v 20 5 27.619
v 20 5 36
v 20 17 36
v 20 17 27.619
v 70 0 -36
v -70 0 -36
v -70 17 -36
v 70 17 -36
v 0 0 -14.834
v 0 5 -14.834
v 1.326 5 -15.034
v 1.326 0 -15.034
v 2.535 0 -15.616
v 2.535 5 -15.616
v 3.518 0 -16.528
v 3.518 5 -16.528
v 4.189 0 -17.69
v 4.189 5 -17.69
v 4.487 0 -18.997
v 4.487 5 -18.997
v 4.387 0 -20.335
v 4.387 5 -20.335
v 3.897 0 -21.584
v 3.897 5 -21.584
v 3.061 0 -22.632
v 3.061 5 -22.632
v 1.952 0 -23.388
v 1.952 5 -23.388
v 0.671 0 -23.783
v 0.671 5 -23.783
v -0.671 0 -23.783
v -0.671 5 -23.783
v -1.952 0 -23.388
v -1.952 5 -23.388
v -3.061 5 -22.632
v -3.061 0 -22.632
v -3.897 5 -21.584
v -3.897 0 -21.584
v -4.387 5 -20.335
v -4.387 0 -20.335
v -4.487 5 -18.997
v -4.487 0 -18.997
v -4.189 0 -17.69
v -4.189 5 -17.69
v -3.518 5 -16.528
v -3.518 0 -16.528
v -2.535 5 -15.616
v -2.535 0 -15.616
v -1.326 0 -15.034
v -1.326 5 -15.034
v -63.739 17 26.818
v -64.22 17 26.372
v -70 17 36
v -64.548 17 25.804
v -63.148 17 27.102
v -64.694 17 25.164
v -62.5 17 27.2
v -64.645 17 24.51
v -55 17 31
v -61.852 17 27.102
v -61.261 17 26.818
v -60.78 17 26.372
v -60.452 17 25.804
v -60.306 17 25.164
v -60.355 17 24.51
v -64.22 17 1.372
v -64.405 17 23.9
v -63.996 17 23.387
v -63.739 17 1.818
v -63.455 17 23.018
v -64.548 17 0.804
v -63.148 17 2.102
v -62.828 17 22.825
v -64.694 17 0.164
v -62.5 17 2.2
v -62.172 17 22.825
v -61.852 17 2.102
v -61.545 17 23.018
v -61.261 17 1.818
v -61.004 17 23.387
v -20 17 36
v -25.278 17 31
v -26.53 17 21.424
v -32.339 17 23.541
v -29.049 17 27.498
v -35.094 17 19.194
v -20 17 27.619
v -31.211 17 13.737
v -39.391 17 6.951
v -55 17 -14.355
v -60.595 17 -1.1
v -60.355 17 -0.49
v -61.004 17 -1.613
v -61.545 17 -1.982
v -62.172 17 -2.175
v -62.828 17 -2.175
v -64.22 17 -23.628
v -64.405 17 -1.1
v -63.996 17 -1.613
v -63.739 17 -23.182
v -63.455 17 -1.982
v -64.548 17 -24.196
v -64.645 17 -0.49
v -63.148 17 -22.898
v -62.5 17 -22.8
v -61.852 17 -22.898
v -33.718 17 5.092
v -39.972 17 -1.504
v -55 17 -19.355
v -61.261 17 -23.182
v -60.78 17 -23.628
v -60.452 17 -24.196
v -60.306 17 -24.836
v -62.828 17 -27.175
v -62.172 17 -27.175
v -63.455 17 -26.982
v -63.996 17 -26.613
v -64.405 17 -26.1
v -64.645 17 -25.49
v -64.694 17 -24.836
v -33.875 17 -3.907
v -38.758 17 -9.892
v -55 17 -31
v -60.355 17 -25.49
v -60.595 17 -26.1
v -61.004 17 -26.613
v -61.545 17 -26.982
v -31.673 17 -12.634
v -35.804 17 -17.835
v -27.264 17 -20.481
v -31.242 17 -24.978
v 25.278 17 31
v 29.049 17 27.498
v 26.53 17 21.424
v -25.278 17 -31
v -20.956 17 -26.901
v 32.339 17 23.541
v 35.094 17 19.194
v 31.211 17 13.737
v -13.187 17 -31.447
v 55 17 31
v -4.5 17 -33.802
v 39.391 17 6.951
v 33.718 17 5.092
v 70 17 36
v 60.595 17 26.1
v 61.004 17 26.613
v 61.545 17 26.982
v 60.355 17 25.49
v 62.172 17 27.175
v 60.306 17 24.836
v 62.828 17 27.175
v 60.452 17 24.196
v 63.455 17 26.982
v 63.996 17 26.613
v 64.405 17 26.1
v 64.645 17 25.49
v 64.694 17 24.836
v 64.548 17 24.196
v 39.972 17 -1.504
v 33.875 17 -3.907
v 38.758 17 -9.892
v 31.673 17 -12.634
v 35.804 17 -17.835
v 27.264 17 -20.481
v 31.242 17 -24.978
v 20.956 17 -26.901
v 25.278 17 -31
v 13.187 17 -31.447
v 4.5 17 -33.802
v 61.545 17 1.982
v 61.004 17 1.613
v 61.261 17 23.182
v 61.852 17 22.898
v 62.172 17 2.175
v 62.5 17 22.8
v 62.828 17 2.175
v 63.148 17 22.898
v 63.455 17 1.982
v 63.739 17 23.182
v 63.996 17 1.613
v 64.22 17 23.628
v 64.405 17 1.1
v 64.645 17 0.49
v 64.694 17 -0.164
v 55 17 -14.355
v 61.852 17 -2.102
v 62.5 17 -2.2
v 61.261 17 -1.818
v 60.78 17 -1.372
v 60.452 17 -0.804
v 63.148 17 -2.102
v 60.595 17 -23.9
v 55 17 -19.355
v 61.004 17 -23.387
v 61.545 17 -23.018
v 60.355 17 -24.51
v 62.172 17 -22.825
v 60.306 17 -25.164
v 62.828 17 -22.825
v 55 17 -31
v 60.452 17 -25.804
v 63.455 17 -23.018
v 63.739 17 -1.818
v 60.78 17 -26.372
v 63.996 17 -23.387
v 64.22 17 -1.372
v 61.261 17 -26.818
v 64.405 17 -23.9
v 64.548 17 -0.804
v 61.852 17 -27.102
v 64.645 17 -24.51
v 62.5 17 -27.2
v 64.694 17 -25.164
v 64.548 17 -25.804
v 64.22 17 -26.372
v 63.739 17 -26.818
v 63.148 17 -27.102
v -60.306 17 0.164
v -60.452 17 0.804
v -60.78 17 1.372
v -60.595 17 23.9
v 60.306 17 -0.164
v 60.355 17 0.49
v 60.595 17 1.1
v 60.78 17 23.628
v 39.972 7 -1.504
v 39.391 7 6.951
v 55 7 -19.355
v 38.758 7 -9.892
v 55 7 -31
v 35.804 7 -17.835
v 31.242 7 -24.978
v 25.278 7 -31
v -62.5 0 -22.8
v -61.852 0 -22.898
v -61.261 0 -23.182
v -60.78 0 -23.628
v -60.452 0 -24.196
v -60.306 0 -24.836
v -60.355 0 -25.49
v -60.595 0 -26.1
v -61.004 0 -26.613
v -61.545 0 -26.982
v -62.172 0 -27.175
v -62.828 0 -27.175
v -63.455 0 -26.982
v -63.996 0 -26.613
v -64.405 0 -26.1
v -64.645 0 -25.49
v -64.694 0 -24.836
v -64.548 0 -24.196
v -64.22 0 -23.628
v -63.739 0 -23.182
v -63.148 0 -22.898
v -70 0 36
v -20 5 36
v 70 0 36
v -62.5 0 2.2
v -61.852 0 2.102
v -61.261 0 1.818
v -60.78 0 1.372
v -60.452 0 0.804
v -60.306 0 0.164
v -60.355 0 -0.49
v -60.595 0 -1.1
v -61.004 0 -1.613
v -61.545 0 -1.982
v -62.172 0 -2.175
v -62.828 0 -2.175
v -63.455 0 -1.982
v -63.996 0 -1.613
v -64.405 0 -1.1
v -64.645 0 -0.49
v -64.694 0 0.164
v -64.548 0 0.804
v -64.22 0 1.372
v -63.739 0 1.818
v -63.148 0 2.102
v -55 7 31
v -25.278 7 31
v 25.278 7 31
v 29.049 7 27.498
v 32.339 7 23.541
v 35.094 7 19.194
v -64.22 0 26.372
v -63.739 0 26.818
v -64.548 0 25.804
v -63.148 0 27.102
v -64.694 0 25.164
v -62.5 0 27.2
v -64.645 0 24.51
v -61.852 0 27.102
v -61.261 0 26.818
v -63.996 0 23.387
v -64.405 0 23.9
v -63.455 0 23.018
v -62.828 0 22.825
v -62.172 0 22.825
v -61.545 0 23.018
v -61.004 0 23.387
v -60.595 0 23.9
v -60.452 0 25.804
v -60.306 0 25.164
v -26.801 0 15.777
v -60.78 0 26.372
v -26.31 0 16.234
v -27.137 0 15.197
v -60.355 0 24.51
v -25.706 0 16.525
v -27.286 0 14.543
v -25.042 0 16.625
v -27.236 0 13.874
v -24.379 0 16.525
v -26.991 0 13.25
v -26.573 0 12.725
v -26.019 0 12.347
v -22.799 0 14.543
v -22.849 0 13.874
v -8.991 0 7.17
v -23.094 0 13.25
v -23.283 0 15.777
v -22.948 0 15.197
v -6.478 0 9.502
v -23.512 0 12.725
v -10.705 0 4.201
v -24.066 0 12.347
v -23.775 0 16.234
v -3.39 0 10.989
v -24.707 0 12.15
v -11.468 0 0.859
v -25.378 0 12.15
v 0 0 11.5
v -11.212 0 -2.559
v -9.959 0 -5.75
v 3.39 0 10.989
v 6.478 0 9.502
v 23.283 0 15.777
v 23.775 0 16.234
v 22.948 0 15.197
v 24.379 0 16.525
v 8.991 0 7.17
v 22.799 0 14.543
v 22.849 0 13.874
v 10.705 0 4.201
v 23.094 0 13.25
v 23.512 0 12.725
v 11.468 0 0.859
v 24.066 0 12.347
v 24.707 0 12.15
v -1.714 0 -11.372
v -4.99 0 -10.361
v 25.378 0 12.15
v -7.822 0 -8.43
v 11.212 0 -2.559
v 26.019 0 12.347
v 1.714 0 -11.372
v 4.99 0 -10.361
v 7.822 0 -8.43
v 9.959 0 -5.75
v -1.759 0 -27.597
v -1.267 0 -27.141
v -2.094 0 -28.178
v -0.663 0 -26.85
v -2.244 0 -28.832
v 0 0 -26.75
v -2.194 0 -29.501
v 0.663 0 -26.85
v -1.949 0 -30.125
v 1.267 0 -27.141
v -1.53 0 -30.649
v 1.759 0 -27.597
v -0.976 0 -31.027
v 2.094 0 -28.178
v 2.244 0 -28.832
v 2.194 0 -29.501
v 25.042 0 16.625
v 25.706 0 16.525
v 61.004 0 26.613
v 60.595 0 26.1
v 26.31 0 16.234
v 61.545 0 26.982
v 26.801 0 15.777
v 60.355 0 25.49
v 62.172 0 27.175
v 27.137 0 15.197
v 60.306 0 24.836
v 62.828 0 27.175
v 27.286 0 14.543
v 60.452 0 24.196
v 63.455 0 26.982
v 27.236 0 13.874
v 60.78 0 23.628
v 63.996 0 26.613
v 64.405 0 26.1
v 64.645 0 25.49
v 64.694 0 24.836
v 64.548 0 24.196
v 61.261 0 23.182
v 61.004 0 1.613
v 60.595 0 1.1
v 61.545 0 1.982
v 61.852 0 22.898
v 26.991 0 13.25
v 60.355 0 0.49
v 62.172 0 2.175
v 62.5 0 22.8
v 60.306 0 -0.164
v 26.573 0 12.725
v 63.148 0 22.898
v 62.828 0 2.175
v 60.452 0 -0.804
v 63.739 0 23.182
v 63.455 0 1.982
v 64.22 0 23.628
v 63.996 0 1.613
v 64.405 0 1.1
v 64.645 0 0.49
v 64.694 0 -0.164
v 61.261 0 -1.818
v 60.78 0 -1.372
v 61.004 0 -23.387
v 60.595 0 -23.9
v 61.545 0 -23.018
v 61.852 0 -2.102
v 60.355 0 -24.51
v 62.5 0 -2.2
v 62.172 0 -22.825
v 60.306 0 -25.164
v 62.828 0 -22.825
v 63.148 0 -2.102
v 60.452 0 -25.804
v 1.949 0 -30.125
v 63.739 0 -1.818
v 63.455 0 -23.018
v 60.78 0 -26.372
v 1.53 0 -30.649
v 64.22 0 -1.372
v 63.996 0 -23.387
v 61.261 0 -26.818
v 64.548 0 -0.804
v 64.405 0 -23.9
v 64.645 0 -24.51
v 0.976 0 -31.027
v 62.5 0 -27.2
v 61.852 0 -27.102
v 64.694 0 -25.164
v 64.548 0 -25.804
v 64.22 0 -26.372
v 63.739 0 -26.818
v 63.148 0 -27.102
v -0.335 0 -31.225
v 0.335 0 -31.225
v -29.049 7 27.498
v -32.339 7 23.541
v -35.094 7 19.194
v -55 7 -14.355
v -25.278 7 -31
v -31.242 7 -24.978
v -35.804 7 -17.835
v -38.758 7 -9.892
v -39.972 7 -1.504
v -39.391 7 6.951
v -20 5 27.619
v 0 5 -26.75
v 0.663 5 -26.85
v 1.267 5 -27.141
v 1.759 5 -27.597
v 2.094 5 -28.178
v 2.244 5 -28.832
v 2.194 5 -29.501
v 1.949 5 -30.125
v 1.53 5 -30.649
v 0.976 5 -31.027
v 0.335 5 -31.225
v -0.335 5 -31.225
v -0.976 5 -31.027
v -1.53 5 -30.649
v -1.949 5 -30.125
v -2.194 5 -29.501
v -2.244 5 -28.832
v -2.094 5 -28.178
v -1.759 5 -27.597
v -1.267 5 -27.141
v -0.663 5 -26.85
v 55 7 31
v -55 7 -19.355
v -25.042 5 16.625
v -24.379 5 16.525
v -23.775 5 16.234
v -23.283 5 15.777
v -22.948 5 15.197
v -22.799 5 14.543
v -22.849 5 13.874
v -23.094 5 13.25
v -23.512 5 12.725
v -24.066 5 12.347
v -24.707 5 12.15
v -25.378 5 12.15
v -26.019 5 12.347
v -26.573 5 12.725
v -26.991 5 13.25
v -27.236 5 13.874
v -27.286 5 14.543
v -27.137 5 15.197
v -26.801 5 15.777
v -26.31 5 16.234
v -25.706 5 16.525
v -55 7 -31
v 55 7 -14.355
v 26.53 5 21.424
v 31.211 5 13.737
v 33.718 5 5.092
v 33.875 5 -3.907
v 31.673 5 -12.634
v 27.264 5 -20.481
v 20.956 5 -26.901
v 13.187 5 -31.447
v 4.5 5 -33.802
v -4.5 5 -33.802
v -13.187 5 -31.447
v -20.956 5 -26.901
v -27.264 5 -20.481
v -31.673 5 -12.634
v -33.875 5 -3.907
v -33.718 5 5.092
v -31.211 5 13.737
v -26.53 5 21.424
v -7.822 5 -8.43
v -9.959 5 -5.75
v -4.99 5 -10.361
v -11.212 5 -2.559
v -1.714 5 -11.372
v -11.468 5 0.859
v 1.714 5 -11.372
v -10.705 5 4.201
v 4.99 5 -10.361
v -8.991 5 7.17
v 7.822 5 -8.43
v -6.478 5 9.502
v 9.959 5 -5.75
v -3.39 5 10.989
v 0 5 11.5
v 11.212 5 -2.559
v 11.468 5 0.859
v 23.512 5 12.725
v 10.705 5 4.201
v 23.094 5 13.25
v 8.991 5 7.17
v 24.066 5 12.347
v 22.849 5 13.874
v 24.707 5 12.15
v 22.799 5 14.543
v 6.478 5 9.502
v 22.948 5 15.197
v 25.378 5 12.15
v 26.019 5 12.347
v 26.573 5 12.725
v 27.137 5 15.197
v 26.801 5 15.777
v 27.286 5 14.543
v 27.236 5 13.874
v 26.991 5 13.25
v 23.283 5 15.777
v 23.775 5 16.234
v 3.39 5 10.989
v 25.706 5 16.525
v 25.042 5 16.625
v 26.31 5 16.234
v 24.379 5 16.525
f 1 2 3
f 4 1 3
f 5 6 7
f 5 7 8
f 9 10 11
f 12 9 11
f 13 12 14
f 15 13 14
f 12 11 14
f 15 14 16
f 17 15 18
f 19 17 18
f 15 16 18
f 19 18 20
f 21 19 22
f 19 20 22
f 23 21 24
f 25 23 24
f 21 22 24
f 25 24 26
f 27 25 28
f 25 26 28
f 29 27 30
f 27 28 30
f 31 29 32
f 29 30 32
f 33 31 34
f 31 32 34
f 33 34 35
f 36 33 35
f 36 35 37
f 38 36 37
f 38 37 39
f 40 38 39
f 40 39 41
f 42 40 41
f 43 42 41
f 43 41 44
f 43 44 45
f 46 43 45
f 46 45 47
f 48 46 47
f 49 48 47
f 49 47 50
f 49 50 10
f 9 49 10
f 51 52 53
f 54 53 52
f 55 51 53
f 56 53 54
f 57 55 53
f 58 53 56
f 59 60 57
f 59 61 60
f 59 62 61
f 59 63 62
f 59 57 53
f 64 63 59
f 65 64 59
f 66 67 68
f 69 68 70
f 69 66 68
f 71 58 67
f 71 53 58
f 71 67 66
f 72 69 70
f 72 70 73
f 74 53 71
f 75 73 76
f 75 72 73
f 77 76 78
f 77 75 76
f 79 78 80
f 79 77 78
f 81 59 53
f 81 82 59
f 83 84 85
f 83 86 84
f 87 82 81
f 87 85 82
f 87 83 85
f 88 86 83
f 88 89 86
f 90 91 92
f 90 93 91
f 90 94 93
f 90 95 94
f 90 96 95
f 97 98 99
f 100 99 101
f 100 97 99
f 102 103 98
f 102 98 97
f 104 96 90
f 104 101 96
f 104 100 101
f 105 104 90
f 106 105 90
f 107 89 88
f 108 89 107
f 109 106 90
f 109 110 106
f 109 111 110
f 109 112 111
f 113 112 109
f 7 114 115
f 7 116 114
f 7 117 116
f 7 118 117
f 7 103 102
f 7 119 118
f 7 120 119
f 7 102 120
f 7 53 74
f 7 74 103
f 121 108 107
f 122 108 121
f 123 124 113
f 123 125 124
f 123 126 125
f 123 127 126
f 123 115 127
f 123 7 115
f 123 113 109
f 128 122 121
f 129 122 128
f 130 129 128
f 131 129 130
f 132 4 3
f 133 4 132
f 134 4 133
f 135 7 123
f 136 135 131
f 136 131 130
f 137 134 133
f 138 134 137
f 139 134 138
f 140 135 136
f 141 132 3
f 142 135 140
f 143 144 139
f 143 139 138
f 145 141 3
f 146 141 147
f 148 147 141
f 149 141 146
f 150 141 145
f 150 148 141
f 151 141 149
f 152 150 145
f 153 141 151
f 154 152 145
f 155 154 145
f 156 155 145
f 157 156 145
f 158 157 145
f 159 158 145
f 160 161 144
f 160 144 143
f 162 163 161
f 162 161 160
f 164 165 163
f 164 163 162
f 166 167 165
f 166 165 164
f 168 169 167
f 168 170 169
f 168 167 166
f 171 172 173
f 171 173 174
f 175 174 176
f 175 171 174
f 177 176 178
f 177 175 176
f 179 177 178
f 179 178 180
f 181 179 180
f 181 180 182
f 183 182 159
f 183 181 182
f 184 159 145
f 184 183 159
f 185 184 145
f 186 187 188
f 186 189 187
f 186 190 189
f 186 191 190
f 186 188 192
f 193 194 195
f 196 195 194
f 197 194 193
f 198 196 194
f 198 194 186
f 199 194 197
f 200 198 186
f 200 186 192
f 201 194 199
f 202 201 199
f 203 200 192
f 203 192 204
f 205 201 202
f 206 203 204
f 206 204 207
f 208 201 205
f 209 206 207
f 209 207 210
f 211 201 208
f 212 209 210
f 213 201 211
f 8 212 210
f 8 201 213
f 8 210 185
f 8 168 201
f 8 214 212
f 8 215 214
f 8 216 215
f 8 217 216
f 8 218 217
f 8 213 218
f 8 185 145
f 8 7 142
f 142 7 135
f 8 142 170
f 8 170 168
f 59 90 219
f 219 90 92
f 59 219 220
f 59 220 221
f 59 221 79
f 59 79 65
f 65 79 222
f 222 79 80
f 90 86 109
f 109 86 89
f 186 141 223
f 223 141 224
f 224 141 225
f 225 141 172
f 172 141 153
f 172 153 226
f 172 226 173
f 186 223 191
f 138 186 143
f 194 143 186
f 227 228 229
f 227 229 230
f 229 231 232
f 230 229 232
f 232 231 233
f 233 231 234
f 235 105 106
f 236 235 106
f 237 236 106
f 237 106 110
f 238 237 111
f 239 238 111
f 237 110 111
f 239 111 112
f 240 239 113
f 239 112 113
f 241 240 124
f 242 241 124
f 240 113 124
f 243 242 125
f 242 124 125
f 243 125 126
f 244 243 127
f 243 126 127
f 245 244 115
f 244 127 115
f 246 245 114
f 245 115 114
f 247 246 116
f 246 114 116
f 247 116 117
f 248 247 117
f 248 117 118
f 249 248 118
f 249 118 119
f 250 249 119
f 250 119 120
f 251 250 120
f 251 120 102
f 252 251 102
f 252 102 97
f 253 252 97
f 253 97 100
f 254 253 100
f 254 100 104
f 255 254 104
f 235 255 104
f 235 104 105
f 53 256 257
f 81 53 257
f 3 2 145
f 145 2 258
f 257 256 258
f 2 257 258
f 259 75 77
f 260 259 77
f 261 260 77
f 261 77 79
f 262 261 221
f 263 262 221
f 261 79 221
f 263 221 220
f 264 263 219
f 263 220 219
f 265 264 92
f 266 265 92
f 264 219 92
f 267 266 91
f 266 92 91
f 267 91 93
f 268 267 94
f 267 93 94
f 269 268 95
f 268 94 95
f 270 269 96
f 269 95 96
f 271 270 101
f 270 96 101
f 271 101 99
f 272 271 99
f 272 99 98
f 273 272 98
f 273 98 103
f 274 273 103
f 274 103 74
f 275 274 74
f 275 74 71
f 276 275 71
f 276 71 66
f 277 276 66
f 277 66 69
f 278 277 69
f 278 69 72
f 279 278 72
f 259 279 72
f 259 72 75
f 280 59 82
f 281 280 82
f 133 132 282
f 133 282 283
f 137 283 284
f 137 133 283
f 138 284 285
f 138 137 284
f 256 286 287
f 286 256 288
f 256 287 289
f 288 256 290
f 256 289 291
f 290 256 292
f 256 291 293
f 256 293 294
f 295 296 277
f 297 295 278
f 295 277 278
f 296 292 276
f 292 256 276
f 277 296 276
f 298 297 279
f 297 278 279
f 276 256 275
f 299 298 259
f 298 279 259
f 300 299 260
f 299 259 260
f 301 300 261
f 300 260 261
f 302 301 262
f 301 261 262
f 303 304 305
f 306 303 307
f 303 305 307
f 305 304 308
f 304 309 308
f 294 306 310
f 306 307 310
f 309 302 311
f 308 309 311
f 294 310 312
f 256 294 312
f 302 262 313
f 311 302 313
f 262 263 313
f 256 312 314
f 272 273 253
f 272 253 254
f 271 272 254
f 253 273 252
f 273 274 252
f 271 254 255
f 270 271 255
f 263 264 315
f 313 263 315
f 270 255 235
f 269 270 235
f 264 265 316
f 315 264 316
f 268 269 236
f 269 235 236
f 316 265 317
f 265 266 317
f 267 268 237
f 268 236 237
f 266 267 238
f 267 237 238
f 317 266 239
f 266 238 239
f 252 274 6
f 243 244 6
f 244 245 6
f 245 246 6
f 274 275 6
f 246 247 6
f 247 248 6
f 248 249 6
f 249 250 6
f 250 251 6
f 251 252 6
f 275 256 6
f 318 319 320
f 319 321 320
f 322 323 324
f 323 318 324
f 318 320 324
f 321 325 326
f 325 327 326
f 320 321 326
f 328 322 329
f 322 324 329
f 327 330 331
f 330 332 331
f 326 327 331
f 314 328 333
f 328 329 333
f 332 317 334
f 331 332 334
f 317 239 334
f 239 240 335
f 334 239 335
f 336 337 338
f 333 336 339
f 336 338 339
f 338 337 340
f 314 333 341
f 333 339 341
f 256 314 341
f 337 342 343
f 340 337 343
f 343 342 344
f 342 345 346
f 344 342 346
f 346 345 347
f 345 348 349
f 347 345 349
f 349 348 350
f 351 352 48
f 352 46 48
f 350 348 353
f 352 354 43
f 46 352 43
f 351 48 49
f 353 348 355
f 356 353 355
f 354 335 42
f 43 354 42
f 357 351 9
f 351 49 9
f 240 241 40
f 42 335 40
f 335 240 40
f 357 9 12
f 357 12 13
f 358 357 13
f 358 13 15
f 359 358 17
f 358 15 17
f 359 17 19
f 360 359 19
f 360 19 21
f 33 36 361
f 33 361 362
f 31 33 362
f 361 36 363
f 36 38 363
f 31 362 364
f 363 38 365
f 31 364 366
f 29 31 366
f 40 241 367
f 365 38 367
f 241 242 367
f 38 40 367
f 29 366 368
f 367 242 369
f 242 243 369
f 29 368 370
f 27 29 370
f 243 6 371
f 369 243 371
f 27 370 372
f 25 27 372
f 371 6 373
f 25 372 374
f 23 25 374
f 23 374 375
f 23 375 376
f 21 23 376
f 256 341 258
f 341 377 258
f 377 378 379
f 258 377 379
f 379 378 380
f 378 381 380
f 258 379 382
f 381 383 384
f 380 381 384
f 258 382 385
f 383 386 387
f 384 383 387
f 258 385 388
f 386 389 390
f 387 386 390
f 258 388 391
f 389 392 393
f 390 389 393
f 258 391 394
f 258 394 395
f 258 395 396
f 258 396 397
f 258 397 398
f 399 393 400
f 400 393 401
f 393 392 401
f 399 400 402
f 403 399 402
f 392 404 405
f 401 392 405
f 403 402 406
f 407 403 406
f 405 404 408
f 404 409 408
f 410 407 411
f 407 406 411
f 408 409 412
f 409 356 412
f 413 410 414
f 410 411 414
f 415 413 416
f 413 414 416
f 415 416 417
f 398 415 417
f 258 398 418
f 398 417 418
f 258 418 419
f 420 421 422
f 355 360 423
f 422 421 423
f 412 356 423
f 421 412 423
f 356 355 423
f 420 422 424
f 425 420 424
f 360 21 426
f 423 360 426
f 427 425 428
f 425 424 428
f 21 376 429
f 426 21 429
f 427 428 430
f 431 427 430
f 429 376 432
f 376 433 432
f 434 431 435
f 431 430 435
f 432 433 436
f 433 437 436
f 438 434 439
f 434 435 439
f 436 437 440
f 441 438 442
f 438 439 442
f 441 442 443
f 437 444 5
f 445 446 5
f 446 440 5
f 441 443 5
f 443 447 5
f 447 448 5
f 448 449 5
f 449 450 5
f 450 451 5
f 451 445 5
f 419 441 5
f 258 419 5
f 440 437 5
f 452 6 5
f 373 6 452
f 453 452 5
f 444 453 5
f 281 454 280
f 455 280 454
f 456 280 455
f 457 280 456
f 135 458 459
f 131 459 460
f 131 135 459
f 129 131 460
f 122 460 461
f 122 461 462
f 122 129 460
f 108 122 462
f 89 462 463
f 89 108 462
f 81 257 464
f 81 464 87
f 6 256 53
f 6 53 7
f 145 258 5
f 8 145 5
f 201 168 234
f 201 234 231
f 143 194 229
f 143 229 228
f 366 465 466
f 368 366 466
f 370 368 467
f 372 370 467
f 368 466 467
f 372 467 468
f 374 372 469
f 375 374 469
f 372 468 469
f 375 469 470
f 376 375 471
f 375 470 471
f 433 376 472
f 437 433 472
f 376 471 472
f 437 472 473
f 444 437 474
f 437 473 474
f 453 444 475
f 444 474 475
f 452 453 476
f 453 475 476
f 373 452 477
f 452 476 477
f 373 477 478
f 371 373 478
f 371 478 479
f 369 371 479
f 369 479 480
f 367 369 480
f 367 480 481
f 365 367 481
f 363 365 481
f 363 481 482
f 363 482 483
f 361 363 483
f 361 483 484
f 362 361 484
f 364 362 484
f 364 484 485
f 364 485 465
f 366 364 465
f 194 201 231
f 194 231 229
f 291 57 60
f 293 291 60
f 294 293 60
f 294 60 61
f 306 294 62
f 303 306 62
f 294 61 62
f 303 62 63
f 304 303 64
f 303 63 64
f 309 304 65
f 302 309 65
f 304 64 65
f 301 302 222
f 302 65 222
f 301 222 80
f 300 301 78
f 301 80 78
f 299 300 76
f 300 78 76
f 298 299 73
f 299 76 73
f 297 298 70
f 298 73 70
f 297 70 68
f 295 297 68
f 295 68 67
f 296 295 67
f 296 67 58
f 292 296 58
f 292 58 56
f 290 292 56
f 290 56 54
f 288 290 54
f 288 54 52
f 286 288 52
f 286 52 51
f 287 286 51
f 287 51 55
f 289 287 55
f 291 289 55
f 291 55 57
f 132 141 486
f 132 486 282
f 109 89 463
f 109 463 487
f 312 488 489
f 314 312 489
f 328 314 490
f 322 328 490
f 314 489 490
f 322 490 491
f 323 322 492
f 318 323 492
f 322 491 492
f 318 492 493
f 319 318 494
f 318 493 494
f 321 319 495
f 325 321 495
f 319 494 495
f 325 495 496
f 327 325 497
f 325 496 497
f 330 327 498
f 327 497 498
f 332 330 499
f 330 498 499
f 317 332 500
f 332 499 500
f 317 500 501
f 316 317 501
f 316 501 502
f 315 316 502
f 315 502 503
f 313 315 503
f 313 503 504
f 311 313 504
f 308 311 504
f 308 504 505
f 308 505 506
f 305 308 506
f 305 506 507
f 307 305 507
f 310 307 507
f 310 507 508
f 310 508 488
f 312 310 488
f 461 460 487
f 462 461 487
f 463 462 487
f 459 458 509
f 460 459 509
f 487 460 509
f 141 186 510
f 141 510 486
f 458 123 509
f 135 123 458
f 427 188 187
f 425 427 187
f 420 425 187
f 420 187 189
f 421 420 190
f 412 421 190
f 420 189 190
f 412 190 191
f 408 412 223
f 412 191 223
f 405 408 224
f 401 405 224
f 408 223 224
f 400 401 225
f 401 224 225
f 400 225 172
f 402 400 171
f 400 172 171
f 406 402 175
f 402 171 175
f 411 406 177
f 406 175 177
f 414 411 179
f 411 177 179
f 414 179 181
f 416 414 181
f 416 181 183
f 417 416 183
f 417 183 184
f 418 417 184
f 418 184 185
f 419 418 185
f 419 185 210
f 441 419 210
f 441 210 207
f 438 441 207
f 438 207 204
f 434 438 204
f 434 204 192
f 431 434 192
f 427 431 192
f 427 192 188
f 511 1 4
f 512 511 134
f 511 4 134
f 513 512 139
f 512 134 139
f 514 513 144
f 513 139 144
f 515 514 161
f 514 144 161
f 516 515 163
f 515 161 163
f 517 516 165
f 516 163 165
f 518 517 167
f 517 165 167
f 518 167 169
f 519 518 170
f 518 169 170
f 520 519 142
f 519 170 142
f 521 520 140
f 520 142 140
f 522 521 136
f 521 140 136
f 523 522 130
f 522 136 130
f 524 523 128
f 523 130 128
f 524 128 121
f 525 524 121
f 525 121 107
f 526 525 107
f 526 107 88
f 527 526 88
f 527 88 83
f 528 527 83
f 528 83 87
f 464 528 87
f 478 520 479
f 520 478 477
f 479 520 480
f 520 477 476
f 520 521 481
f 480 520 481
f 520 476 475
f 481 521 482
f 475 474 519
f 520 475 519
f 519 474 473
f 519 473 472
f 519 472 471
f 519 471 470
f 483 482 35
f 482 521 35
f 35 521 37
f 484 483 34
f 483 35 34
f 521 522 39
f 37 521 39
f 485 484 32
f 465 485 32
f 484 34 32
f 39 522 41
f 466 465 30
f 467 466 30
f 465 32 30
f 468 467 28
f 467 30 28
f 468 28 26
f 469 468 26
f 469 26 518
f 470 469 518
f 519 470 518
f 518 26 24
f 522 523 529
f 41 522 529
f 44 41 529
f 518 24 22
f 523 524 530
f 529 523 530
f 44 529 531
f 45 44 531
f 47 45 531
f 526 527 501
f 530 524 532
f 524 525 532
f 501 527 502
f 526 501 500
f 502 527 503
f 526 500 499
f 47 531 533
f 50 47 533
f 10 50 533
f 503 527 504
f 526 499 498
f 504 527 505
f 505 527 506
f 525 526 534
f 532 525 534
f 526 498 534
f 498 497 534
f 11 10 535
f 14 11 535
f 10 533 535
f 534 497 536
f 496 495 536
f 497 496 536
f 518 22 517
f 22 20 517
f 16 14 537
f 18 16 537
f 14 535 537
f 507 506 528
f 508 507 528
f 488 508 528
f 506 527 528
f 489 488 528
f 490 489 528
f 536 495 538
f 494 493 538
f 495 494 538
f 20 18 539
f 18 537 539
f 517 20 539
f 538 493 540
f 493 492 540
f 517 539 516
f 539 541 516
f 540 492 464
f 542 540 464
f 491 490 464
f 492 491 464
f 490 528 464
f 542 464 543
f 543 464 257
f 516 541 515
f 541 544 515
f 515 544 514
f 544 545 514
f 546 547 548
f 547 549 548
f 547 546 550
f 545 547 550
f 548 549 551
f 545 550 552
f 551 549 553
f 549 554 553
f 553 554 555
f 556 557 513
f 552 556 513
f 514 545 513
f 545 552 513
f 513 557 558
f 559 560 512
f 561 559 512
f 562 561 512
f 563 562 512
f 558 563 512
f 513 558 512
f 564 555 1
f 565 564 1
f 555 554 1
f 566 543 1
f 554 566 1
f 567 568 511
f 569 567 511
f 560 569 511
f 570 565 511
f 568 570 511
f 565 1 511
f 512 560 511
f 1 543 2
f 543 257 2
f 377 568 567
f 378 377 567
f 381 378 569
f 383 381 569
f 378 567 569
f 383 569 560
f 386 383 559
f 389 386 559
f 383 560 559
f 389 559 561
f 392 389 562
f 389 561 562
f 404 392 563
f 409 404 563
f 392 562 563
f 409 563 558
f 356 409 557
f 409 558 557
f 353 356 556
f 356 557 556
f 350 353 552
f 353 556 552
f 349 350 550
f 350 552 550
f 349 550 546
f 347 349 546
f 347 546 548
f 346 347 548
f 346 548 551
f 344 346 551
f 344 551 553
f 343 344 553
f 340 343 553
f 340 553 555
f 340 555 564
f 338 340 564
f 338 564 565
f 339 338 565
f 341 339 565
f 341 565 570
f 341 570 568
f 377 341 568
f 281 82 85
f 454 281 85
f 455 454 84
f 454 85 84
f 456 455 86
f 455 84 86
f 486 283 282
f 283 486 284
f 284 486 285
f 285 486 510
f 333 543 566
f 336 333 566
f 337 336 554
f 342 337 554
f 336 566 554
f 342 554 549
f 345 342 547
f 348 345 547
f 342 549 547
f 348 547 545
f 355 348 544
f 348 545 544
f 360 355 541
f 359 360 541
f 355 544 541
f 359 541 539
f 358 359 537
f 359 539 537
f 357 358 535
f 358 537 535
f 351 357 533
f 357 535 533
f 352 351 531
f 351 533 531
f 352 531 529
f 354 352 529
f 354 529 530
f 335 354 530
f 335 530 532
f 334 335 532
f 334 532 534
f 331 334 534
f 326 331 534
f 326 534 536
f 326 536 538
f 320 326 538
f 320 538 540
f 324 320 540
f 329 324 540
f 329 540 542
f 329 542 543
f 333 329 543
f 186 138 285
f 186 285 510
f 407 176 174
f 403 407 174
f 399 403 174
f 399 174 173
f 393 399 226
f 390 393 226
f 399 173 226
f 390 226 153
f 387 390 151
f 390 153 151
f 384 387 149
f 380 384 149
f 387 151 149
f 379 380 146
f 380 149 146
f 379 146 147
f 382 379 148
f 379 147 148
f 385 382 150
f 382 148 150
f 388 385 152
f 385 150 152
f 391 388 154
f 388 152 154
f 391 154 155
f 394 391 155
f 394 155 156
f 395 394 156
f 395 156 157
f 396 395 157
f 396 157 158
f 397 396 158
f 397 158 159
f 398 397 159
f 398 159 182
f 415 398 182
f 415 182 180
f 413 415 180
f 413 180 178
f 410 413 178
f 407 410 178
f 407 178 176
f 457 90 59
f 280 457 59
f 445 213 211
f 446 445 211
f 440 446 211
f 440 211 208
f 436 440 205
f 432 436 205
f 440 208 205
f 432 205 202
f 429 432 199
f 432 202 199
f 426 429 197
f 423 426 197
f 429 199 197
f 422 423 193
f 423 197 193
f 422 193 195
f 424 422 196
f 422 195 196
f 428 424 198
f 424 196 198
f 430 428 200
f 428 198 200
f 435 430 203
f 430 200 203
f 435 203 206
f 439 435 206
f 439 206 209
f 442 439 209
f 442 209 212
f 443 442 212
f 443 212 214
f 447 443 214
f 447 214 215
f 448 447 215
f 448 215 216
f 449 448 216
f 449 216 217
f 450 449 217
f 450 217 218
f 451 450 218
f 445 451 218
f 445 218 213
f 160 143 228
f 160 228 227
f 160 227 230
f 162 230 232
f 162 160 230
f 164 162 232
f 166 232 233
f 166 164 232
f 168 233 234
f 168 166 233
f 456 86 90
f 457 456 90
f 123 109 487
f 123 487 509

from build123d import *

# Parameters (mm, degrees)
SKETCH1_W           = 140
SKETCH1_H           = 72
BOSS_EXTRUDE1_DEPTH = 17
SKETCH2_R           = 34.1
CUT_EXTRUDE1_DEPTH  = 12
SKETCH3_W           = 40
SKETCH3_H           = 24
CUT_EXTRUDE2_DEPTH  = 10
SKETCH4_R           = 2.2
CUT_EXTRUDE3_DEPTH  = 81.529497701
SKETCH5_R           = 2.25
SKETCH5_R_2         = 4.5
CUT_EXTRUDE4_DEPTH  = 80.62411695
CUT_EXTRUDE5_DEPTH  = 10
SKETCH7_R           = 11.5
CUT_EXTRUDE6_DEPTH  = 10


with BuildPart() as part:
    # Sketch1 → Boss-Extrude1 (new body)
    with BuildSketch(Plane(origin=(0, 0, 0), x_dir=(1, 0, 0), z_dir=(0, 1, 0))):
        Rectangle(SKETCH1_W, SKETCH1_H)
    extrude(amount=BOSS_EXTRUDE1_DEPTH)

    # Sketch2 → Cut-Extrude1 (cut)
    with BuildSketch(Plane(origin=(0, 17, 0), x_dir=(1, 0, 0), z_dir=(0, 1, 0))):
        with Locations(Location((0, 0, 0), (0, 0, 270))):
            Circle(SKETCH2_R)
    extrude(amount=-CUT_EXTRUDE1_DEPTH, mode=Mode.SUBTRACT)

    # Sketch3 → Cut-Extrude2 (cut)
    with BuildSketch(Plane.XY.offset(36)):
        with Locations((0, 17)):
            Rectangle(SKETCH3_W, SKETCH3_H)
    extrude(amount=-CUT_EXTRUDE2_DEPTH, mode=Mode.SUBTRACT)

    # Sketch4 → Cut-Extrude3 (cut, through all)
    with BuildSketch(Plane(origin=(0, 17, 0), x_dir=(1, 0, 0), z_dir=(0, 1, 0))):
        with Locations(Location((-62.5, 25, 0), (0, 0, 270))):
            Circle(SKETCH4_R)
        with Locations(Location((-62.5, 0, 0), (0, 0, 270))):
            Circle(SKETCH4_R)
        with Locations(Location((-62.5, -25, 0), (0, 0, 270))):
            Circle(SKETCH4_R)
        with Locations(Location((62.5, -25, 0), (0, 0, 90))):
            Circle(SKETCH4_R)
        with Locations(Location((62.5, 0, 0), (0, 0, 90))):
            Circle(SKETCH4_R)
        with Locations(Location((62.5, 25, 0), (0, 0, 90))):
            Circle(SKETCH4_R)
    extrude(amount=-CUT_EXTRUDE3_DEPTH, mode=Mode.SUBTRACT)

    # Sketch5 → Cut-Extrude4 (cut, through all)
    with BuildSketch(Plane(origin=(0, 5, 0), x_dir=(1, 0, 0), z_dir=(0, 1, 0))):
        with Locations(Location((0, 29, 0), (0, 0, 270))):
            Circle(SKETCH5_R)
        with Locations(Location((25.042343364, -14.374611046, 0), (0, 0, 270))):
            Circle(SKETCH5_R)
        with Locations(Location((-25.042343364, -14.374611046, 0), (0, 0, 270))):
            Circle(SKETCH5_R)
        with Locations(Location((0, 19.333592636, 0), (0, 0, 270))):
            Circle(SKETCH5_R_2)
    extrude(amount=-CUT_EXTRUDE4_DEPTH, mode=Mode.SUBTRACT)

    # Sketch6 → Cut-Extrude5 (cut)
    with BuildSketch(Plane(origin=(0, 17, 0), x_dir=(1, 0, 0), z_dir=(0, 1, 0))):
        with BuildLine():
            Line((-55, 31), (-25.27844932, 31))
            ThreePointArc((-25.27844932, 31), (-37.491645865, 13.941896942), (-39.391334679, -6.951456838))
            Line((-39.391334679, -6.951456838), (-55, 19.35498509))
            Line((-55, 19.35498509), (-55, 31))
        make_face()
        with BuildLine():
            Line((-55, -31), (-25.27844932, -31))
            ThreePointArc((-25.27844932, -31), (-30.757821307, -25.5725718), (-35.093761786, -19.194475343))
            Line((-35.093761786, -19.194475343), (-55, 14.35498509))
            Line((-55, 14.35498509), (-55, -31))
        make_face()
        with BuildLine():
            Line((55, -31), (25.27844932, -31))
            ThreePointArc((25.27844932, -31), (30.757821307, -25.5725718), (35.093761786, -19.194475343))
            Line((35.093761786, -19.194475343), (55, 14.35498509))
            Line((55, 14.35498509), (55, -31))
        make_face()
        with BuildLine():
            Line((55, 31), (55, 19.35498509))
            Line((55, 19.35498509), (39.391334679, -6.951456838))
            ThreePointArc((39.391334679, -6.951456838), (37.491645865, 13.941896942), (25.27844932, 31))
            Line((25.27844932, 31), (55, 31))
        make_face()
    extrude(amount=-CUT_EXTRUDE5_DEPTH, mode=Mode.SUBTRACT)

    # Sketch7 → Cut-Extrude6 (cut)
    with BuildSketch(Plane(origin=(0, 5, 0), x_dir=(1, 0, 0), z_dir=(0, 1, 0))):
        with Locations(Location((0, 0, 0), (0, 0, 270))):
            Circle(SKETCH7_R)
    extrude(amount=-CUT_EXTRUDE6_DEPTH, mode=Mode.SUBTRACT)


solid = part.part
